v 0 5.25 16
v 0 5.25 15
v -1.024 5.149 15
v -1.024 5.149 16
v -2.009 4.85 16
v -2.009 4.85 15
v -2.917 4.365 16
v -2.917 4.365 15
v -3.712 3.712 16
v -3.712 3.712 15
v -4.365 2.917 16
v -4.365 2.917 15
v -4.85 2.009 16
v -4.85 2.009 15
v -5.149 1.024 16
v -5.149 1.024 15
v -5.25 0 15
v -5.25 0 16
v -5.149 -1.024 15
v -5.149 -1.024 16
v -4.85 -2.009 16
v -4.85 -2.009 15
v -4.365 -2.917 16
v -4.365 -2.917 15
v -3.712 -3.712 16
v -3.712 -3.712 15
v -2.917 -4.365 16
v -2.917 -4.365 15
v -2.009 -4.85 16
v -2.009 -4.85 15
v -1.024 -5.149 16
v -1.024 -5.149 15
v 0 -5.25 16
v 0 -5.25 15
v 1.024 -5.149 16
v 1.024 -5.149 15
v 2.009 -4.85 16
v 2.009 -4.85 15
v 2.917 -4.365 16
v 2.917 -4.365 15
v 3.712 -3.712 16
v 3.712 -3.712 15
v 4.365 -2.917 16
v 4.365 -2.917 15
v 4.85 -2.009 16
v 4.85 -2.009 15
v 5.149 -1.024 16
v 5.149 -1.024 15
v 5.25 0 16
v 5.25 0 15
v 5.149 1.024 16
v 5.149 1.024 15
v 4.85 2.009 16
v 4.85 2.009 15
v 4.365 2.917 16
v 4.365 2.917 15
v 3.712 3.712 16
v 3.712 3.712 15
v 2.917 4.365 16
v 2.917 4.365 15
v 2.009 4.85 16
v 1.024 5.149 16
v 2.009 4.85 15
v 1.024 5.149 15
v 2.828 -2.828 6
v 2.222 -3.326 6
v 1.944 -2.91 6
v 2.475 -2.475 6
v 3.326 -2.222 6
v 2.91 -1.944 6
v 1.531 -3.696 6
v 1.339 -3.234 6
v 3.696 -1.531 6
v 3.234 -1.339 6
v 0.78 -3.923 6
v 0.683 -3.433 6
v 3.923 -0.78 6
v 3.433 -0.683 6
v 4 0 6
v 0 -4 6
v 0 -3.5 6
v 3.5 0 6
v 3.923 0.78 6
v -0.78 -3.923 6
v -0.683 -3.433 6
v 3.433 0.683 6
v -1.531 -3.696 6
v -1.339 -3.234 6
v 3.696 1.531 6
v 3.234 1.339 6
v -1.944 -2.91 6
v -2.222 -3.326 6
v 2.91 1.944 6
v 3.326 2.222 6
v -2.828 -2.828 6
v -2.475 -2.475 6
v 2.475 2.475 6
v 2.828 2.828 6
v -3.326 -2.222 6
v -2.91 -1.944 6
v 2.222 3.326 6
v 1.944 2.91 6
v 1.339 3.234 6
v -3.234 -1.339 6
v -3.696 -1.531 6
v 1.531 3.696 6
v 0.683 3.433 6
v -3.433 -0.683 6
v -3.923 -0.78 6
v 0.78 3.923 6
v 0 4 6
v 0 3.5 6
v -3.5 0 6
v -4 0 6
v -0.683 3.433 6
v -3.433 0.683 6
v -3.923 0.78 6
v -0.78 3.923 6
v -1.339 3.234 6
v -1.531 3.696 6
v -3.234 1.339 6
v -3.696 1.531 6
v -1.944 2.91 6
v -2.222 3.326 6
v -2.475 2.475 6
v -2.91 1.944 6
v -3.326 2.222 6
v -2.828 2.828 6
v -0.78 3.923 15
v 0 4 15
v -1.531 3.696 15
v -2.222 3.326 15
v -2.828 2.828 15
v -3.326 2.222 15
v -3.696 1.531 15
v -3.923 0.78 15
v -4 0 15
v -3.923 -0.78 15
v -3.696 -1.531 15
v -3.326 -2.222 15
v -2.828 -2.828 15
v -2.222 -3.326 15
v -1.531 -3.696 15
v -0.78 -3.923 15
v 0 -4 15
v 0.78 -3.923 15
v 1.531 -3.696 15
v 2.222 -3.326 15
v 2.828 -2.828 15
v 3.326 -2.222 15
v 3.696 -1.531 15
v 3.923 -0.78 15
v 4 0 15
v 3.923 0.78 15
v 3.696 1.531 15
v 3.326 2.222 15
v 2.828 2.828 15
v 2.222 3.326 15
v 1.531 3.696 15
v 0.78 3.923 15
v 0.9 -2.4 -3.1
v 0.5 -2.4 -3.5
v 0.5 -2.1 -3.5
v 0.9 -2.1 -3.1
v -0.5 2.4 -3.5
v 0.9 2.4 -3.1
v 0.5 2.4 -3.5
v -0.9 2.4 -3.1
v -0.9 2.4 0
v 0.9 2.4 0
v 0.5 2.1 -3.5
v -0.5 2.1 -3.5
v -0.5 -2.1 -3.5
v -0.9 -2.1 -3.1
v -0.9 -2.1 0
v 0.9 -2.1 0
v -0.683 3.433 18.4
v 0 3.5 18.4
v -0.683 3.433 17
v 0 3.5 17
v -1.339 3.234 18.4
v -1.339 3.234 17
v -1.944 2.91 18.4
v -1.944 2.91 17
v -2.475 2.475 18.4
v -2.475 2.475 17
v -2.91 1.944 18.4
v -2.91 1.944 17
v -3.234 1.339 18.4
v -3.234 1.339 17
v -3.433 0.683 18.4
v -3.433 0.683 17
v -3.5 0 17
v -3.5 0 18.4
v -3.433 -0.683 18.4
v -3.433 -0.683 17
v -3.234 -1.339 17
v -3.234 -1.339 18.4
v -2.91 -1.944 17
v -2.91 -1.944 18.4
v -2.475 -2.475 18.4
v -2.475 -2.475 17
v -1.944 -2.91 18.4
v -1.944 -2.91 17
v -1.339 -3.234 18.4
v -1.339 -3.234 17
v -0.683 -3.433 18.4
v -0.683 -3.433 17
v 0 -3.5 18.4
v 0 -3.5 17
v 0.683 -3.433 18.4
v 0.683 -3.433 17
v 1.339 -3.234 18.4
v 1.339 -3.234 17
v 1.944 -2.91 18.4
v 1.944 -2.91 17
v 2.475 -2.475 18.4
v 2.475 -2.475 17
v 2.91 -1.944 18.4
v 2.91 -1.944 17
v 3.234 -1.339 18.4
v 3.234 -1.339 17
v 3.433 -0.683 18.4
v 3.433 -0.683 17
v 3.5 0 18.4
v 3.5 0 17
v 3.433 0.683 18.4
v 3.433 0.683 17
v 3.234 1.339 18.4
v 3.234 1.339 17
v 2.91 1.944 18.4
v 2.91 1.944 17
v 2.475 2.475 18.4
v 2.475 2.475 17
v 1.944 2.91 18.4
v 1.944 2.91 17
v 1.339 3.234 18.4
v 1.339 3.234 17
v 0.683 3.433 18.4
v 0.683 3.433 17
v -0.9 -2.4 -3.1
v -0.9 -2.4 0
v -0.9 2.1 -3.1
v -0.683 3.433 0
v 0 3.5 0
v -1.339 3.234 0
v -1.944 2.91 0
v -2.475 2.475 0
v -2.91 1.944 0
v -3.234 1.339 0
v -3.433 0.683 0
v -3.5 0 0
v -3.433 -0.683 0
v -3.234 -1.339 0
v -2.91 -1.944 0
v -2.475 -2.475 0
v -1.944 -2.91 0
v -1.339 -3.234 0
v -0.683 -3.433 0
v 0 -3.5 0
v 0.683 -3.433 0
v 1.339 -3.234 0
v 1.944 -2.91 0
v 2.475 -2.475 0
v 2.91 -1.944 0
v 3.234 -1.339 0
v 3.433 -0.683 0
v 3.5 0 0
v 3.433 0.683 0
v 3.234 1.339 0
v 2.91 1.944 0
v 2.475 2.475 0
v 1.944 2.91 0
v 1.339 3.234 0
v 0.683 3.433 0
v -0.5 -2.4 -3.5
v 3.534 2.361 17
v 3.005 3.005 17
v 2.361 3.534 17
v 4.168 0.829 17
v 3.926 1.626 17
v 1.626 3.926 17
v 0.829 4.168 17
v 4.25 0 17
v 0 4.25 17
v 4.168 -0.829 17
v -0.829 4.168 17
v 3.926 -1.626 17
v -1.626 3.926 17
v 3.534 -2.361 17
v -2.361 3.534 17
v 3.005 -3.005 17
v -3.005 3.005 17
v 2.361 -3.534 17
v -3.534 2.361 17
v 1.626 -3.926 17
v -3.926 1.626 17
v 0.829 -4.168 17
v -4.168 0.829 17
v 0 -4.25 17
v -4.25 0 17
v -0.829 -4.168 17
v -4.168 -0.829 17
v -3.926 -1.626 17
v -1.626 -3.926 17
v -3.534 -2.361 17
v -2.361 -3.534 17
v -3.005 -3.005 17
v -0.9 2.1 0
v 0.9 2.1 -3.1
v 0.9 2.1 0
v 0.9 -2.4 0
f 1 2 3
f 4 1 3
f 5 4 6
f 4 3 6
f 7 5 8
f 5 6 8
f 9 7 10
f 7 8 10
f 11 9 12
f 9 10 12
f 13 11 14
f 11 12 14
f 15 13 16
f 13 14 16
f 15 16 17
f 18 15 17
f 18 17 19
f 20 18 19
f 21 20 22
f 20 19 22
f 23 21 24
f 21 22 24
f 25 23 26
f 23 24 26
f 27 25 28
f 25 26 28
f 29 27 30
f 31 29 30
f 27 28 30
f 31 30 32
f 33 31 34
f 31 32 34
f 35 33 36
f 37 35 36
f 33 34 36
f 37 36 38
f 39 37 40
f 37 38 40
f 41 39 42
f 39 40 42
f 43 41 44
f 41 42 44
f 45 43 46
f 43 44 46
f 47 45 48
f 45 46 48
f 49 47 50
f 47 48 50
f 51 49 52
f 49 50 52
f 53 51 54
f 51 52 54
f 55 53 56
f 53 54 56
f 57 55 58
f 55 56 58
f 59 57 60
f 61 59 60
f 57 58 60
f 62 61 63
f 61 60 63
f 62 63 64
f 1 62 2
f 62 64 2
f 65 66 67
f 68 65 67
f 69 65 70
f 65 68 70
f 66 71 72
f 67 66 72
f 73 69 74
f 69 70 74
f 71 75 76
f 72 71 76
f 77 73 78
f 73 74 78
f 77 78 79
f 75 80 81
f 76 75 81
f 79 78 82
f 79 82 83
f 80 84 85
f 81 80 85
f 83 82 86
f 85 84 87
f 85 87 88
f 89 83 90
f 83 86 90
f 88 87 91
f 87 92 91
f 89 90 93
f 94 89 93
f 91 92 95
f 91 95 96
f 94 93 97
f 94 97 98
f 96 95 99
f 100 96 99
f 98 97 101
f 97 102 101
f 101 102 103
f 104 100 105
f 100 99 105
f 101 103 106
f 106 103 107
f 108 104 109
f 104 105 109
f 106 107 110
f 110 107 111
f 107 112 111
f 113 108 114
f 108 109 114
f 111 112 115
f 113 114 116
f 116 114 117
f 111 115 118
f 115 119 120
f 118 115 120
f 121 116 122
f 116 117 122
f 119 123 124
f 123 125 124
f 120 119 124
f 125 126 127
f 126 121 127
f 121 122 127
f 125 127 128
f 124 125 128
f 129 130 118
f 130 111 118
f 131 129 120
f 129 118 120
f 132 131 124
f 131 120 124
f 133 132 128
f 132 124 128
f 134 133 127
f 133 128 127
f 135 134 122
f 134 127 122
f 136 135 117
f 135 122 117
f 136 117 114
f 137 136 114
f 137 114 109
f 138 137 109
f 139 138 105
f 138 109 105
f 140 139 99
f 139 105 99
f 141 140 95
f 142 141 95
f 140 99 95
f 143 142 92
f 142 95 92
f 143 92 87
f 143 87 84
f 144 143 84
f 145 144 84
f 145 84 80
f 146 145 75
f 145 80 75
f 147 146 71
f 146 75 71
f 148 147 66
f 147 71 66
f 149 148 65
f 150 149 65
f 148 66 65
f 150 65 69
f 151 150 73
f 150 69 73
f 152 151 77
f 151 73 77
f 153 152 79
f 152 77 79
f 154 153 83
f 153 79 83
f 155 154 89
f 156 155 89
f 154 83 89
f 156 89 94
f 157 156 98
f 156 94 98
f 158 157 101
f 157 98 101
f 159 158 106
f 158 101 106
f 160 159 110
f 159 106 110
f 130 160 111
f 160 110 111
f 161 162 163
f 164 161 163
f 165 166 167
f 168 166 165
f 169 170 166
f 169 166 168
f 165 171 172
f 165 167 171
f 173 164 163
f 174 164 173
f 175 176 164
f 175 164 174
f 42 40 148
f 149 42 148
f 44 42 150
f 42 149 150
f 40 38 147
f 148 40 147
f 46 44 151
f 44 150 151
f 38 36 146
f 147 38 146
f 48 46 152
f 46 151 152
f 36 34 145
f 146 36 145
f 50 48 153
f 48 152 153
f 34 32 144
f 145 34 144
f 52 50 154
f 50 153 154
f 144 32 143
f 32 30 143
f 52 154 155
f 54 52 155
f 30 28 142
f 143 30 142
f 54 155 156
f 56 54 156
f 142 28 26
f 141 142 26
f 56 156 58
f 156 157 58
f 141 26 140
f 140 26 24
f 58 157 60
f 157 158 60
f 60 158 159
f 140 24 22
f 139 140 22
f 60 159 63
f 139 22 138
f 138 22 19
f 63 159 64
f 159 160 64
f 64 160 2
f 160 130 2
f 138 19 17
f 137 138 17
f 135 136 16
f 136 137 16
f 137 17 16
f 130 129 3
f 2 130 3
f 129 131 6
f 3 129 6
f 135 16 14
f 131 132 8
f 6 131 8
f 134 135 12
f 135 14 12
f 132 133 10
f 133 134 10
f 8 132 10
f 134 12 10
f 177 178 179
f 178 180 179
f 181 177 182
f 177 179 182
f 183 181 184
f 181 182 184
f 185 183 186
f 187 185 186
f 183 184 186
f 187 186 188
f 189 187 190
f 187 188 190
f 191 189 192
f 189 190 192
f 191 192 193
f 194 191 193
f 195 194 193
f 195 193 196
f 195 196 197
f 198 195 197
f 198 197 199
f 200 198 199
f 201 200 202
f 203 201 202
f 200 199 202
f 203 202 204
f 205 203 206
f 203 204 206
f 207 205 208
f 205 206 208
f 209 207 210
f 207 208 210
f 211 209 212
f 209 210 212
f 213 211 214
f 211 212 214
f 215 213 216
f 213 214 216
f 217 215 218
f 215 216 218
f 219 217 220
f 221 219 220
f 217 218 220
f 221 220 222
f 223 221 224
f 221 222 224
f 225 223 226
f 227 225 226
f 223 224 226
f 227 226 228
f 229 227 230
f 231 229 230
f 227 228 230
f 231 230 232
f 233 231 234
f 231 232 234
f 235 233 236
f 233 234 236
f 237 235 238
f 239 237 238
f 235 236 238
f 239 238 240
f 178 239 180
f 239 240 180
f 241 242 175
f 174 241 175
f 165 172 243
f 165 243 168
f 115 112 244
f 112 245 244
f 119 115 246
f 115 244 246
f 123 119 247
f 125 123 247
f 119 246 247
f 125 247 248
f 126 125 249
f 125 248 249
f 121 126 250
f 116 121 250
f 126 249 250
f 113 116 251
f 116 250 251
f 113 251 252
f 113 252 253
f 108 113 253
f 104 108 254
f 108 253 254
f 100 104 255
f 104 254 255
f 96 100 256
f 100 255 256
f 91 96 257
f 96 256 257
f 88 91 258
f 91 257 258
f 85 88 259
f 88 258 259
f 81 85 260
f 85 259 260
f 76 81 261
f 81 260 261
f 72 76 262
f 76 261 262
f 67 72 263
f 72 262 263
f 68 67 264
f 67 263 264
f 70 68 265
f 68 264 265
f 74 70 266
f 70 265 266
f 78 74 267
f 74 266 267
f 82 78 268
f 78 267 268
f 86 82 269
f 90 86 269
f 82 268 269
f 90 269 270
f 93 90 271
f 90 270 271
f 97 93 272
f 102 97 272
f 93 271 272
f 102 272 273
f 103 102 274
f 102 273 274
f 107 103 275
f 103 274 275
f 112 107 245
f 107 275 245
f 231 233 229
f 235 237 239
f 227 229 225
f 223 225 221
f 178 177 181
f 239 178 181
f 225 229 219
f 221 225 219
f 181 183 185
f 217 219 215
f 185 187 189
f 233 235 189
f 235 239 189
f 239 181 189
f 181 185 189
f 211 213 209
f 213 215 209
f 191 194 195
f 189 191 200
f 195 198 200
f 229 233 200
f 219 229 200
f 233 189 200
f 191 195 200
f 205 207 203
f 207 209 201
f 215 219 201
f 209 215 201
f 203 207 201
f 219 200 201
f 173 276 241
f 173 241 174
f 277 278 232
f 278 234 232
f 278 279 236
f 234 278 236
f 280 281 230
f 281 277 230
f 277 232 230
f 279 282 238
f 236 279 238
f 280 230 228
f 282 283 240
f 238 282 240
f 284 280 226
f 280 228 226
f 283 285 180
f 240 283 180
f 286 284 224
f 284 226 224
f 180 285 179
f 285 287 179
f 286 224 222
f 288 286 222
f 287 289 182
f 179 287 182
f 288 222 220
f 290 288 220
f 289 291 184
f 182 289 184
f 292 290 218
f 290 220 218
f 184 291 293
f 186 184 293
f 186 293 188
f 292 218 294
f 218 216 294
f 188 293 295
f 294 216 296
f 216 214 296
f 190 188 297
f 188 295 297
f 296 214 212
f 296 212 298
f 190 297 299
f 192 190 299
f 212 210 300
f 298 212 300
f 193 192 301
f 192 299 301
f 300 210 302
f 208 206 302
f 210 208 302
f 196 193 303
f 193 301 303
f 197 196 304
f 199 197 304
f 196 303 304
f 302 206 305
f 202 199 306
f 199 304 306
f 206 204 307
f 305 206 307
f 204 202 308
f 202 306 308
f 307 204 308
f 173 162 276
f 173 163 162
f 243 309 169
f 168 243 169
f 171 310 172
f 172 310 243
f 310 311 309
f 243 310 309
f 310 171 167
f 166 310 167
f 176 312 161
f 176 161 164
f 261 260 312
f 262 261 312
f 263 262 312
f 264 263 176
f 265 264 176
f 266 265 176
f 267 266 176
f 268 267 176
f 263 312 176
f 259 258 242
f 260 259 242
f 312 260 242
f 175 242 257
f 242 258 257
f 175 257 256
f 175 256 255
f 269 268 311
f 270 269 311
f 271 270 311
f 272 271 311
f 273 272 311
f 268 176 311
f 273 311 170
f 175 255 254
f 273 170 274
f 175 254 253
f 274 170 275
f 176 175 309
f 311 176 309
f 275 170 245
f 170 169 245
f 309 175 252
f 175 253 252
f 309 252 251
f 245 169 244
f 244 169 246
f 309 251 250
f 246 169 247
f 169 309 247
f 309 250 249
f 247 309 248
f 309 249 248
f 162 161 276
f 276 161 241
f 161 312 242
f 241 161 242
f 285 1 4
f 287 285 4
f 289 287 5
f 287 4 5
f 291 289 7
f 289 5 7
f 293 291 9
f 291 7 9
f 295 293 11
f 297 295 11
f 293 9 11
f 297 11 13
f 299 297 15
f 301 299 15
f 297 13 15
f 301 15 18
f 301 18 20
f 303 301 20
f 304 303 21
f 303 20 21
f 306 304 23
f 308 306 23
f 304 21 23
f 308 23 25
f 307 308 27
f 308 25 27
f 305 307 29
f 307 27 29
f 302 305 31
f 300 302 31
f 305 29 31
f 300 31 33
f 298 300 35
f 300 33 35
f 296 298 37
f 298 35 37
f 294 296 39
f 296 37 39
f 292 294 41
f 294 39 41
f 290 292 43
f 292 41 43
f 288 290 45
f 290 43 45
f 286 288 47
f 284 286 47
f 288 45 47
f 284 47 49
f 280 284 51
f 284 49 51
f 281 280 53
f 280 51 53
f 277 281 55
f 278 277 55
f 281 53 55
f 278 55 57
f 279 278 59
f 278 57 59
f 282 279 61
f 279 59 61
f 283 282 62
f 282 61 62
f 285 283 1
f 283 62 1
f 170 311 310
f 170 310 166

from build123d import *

# Parameters (mm, degrees)
SKETCH_6_W      = 1.8
SKETCH_6_H      = 0.3
EXTRUDE_2_DEPTH = 3.5
CHAMFER_2_SIZE  = 1
CHAMFER_3_SIZE  = 0.4


with BuildPart() as part:
    # 草图1 → 旋转2 (revolve)
    with BuildSketch(Plane(origin=(0, 0, 0), x_dir=(0, 0, -1), z_dir=(1, 0, 0))):
        Polygon((-18.4, 0), (-18.4, 3.5), (-17, 3.5), (-17, 5.25), (-15, 5.25), (-15, 4), (-6, 4), (-6, 3.5), (0, 3.5), (0, 0), align=None)
    revolve(axis=Axis((0, 0, 0), (0, 0, 1)))

    # 草图6 → 凸台-拉伸2 (add)
    with BuildSketch(Plane(origin=(0, 0, 0), x_dir=(-1, 0, 0), z_dir=(0, 0, -1))):
        with Locations((0, 2.25)):
            Rectangle(SKETCH_6_W, SKETCH_6_H)
        with Locations((0, -2.25)):
            Rectangle(SKETCH_6_W, SKETCH_6_H)
    extrude(amount=EXTRUDE_2_DEPTH)

    # 倒角2
    chamfer_2_edges = [part.edges().sort_by_distance(p)[0] for p in [
        (0, -5.25, 17),
    ]]
    chamfer(chamfer_2_edges, length=CHAMFER_2_SIZE)

    # 倒角3
    chamfer_3_edges = [part.edges().sort_by_distance(p)[0] for p in [
        (-0.9, 2.25, -3.5),
        (0.9, 2.25, -3.5),
        (-0.9, -2.25, -3.5),
        (0.9, -2.25, -3.5),
    ]]
    chamfer(chamfer_3_edges, length=CHAMFER_3_SIZE)


solid = part.part
